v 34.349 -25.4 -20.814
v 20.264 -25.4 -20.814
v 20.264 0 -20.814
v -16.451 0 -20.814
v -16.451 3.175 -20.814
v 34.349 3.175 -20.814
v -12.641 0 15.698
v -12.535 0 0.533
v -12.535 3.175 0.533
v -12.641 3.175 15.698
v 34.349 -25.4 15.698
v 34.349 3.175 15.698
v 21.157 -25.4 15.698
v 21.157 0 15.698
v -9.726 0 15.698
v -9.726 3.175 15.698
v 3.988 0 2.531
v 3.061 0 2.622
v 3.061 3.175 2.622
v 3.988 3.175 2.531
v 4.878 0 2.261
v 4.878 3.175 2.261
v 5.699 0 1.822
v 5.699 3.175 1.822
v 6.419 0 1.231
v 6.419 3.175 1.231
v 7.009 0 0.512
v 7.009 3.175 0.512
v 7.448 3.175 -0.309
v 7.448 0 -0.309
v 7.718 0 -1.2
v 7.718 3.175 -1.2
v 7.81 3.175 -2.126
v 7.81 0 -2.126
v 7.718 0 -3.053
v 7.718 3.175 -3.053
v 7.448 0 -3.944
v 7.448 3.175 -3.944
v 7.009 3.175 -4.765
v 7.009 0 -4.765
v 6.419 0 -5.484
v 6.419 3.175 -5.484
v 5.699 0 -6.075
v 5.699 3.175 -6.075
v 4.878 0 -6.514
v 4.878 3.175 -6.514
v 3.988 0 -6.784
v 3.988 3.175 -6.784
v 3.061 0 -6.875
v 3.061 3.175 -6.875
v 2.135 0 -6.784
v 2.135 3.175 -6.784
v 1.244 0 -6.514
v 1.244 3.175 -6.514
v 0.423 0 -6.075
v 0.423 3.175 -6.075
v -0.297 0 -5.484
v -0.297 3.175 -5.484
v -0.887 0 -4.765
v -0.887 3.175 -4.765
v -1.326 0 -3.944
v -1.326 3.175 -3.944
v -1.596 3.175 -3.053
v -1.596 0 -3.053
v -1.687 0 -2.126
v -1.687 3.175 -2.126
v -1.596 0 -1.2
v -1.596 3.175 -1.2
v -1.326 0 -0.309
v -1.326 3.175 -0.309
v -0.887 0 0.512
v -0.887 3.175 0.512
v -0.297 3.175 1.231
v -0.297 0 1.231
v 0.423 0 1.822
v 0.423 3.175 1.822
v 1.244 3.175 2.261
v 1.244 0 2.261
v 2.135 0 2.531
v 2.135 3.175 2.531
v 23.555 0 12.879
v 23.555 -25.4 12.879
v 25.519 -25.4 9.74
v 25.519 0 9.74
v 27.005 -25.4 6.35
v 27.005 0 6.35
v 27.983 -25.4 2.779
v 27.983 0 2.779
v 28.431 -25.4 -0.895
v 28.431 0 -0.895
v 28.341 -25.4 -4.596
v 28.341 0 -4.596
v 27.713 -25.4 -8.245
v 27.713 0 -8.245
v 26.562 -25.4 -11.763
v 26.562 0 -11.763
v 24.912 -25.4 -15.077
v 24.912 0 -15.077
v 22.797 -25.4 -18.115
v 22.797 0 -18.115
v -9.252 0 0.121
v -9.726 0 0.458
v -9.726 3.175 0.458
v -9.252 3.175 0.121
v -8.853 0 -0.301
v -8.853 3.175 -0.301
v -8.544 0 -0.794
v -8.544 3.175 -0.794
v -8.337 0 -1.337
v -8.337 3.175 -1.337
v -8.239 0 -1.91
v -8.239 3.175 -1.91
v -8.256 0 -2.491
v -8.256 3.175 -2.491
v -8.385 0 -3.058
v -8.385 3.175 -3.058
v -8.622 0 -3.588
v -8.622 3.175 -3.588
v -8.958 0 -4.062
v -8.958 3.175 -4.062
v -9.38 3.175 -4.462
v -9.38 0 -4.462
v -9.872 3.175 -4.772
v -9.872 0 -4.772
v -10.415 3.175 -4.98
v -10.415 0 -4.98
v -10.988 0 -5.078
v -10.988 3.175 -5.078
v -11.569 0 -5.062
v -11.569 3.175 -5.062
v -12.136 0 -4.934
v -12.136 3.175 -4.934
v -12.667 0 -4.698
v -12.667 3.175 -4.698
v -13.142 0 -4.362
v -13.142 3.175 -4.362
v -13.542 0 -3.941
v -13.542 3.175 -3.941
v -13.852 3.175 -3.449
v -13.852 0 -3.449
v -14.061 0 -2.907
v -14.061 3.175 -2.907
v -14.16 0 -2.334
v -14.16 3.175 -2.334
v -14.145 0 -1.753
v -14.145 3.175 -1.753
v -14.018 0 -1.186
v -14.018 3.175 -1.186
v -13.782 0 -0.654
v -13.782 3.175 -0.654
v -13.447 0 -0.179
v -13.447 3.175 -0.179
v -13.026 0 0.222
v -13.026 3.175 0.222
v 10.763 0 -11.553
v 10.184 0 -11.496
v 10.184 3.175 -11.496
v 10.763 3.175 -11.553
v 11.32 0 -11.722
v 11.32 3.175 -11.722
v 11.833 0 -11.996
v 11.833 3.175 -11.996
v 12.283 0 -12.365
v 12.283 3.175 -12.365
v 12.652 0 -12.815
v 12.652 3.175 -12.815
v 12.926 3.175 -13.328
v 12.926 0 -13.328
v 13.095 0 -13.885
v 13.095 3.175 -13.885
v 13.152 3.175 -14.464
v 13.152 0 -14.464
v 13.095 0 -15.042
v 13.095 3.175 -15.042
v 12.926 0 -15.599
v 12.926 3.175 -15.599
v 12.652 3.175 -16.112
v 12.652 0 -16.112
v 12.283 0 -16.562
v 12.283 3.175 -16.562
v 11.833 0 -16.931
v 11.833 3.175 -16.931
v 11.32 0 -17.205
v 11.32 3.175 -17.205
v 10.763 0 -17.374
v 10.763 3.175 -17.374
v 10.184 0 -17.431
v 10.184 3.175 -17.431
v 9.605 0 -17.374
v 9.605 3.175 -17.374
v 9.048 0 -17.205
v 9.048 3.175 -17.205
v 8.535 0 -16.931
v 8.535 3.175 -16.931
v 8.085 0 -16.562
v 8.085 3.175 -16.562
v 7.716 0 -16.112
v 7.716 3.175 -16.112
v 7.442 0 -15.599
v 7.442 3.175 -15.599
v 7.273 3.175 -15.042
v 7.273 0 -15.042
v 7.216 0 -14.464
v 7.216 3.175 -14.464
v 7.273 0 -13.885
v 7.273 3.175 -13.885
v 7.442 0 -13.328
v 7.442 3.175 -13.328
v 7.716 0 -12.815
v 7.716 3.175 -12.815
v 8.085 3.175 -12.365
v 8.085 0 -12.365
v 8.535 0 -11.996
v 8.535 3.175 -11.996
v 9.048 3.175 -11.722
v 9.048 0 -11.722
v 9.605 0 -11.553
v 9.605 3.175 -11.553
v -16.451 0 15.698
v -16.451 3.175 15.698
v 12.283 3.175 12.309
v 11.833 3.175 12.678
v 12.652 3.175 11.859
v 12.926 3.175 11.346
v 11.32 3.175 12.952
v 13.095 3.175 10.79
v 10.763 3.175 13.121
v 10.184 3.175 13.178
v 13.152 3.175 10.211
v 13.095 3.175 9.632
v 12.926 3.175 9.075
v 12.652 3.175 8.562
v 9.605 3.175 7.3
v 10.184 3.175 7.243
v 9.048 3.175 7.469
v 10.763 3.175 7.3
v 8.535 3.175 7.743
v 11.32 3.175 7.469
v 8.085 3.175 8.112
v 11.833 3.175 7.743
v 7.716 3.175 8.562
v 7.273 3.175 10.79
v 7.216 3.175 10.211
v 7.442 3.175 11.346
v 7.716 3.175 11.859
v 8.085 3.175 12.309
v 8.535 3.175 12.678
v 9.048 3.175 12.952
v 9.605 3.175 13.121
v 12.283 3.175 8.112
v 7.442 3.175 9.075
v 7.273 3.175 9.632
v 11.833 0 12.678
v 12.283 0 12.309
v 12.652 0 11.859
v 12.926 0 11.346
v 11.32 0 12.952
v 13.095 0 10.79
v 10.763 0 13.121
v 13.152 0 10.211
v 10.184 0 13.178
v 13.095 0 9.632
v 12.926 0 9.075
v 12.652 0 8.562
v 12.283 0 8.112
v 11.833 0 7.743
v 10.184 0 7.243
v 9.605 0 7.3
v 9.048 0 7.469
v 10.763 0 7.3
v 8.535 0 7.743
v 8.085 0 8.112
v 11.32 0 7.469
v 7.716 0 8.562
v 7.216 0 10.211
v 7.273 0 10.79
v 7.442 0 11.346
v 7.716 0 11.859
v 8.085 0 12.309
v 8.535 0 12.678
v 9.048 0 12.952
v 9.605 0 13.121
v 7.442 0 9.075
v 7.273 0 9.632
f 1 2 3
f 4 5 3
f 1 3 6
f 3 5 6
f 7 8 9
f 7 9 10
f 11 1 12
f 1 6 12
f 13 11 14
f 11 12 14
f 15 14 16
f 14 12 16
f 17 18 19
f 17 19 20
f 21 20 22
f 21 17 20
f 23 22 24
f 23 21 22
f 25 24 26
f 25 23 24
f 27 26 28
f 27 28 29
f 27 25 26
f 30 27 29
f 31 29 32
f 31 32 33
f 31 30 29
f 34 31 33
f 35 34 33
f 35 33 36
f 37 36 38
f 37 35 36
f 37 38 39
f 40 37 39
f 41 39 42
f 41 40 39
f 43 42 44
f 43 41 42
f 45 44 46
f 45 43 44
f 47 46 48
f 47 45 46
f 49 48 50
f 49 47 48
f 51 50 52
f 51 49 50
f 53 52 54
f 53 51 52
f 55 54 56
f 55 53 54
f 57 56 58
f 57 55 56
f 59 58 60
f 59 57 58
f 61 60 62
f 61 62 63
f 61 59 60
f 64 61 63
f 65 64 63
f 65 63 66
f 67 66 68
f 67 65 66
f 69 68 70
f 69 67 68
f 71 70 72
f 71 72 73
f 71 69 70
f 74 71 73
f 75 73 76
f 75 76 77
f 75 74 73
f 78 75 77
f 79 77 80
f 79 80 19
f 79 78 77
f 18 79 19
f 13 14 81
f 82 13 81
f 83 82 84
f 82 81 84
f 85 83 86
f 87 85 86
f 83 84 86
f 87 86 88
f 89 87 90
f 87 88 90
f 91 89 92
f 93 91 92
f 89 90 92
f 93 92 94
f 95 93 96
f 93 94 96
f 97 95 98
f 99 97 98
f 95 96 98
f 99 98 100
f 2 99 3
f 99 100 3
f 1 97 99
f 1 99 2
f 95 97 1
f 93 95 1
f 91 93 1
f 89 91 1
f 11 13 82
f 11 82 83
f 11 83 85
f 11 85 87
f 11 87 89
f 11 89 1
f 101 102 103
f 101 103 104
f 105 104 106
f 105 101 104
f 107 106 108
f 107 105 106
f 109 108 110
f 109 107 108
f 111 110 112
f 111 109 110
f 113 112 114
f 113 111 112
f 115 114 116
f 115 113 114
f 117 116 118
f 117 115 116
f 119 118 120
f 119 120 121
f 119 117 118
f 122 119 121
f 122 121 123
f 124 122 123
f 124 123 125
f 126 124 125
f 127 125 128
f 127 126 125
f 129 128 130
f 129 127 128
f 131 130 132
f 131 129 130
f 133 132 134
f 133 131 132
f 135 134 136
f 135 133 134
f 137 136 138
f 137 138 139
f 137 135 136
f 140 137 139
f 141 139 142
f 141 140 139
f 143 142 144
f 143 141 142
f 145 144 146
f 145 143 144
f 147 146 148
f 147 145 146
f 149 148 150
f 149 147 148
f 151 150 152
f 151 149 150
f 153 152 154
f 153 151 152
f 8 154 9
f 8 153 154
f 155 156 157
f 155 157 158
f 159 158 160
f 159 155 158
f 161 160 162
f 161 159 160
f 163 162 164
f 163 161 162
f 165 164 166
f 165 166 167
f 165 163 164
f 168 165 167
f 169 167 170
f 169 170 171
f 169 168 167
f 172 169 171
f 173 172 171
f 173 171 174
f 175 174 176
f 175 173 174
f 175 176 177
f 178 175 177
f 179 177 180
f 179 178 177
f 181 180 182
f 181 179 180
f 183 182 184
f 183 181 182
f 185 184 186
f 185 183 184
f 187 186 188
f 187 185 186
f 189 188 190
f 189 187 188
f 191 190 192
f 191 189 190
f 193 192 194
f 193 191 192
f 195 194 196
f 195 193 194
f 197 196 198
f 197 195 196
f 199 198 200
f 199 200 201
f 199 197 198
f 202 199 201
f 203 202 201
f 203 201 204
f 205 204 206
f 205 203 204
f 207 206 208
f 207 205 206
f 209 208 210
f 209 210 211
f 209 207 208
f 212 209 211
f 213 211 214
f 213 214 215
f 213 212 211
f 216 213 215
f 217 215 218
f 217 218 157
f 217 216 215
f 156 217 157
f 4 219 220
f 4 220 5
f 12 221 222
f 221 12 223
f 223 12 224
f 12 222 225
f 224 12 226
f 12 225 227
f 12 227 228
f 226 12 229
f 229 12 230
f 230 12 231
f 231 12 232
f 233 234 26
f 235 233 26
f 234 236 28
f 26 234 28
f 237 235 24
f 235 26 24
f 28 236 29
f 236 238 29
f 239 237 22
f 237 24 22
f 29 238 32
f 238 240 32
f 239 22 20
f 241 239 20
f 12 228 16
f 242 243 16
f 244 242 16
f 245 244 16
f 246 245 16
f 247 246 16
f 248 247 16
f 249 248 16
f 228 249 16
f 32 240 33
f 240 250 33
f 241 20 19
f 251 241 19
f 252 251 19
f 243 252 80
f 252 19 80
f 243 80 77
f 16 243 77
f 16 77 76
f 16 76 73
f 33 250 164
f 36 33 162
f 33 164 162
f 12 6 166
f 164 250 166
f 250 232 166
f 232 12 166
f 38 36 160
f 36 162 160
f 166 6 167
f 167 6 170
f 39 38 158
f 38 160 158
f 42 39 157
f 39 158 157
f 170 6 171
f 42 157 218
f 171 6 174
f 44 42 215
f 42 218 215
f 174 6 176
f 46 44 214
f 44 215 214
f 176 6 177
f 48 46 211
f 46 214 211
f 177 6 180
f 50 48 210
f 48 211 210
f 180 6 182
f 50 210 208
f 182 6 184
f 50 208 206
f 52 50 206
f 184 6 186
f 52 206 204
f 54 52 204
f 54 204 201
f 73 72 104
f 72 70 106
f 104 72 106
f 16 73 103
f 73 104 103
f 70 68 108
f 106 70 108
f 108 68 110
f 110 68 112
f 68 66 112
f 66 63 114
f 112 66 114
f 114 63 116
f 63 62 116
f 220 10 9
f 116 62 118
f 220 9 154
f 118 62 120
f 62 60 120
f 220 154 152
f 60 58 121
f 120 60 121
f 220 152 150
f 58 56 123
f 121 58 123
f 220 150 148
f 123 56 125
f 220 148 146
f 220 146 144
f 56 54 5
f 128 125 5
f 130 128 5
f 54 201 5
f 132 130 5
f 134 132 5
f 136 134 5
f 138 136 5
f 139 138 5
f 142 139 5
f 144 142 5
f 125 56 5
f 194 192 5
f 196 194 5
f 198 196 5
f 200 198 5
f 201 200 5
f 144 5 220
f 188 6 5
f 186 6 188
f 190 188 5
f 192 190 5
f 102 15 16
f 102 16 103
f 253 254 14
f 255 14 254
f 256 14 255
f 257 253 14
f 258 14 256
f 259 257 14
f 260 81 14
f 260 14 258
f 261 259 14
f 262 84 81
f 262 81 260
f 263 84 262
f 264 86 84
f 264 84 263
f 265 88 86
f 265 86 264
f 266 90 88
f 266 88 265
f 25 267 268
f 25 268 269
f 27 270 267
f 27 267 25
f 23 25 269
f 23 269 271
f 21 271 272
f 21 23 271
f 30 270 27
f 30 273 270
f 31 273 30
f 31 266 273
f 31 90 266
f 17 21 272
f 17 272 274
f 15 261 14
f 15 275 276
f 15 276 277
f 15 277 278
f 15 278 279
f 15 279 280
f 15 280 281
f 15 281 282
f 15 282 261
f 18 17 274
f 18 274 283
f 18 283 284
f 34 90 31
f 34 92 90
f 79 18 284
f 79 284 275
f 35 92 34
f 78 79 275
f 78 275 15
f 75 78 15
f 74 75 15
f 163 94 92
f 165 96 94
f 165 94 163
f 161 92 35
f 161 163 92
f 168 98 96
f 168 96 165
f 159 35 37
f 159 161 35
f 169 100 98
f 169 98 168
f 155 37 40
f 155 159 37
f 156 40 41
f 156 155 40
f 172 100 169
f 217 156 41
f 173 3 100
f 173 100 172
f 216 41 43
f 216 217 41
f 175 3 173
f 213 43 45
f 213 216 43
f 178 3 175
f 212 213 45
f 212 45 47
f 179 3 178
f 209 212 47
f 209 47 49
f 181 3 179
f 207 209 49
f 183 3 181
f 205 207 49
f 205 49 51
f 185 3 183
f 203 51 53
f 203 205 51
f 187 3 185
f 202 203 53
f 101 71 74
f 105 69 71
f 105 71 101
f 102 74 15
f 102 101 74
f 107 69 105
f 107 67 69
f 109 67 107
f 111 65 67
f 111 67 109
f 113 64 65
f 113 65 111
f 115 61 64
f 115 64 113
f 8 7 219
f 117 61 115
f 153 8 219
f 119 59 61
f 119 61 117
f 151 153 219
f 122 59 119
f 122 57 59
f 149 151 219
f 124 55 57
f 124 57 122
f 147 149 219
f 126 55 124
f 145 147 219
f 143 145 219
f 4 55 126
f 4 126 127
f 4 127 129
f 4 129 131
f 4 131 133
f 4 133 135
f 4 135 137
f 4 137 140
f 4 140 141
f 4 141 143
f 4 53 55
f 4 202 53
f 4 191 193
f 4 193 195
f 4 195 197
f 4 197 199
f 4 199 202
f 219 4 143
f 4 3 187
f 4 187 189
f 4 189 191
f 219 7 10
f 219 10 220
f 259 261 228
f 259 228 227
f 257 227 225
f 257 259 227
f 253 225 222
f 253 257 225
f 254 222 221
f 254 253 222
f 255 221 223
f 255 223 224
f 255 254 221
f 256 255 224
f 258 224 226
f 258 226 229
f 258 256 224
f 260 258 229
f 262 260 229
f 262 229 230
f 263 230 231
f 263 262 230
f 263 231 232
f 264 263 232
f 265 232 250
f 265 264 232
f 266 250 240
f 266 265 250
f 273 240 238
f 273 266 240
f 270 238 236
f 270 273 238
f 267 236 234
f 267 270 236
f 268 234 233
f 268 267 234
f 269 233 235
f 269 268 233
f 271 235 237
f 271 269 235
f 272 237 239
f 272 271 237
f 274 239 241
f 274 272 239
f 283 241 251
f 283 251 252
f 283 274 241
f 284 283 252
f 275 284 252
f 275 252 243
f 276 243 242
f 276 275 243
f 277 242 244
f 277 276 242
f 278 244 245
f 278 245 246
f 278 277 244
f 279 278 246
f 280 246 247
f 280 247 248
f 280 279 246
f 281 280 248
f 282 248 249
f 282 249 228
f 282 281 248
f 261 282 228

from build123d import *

# Parameters (mm, degrees)
SKETCH1_R           = 4.748524974
SKETCH1_R_2         = 2.967828109
BOSS_EXTRUDE1_DEPTH = 3.175
BOSS_EXTRUDE2_DEPTH = 25.4


with BuildPart() as part:
    # Sketch1 → Boss-Extrude1 (new body)
    with BuildSketch(Plane(origin=(0, 0, 0), x_dir=(1, 0, 0), z_dir=(0, 1, 0))):
        with BuildLine():
            Line((-12.535412203, -0.532735955), (-12.641288389, -15.698136108))
            Line((-12.641288389, -15.698136108), (-16.451288389, -15.698136108))
            Line((-16.451288389, -15.698136108), (-16.451288389, 20.814363892))
            Line((-16.451288389, 20.814363892), (34.348711611, 20.814363892))
            Line((34.348711611, 20.814363892), (34.348711611, -15.698136108))
            Line((34.348711611, -15.698136108), (-9.725725357, -15.698136108))
            Line((-9.725725357, -15.698136108), (-9.725725357, -0.458136108))
            ThreePointArc((-9.725725357, -0.458136108), (-11.278719551, 5.08443165), (-12.535412203, -0.532735955))
        make_face()
        with Locations(Location((3.061154267, 2.126474445, 0), (0, 0, 270))):
            Circle(SKETCH1_R, mode=Mode.SUBTRACT)
        with Locations(Location((10.183941728, 14.463504219, 0), (0, 0, 270))):
            Circle(SKETCH1_R_2, mode=Mode.SUBTRACT)
        with Locations(Location((10.183941728, -10.210555329, 0), (0, 0, 270))):
            Circle(SKETCH1_R_2, mode=Mode.SUBTRACT)
    extrude(amount=BOSS_EXTRUDE1_DEPTH)

    # Sketch2 → Boss-Extrude2 (add)
    with BuildSketch(Plane.XZ):
        with BuildLine():
            Line((20.263560728, -20.814363892), (34.348711611, -20.814363892))
            Line((34.348711611, -20.814363892), (34.348711611, 15.698136108))
            Line((34.348711611, 15.698136108), (21.156547566, 15.698136108))
            ThreePointArc((21.156547566, 15.698136108), (28.453561223, -2.747496977), (20.263560728, -20.814363892))
        make_face()
    extrude(amount=BOSS_EXTRUDE2_DEPTH)


solid = part.part
